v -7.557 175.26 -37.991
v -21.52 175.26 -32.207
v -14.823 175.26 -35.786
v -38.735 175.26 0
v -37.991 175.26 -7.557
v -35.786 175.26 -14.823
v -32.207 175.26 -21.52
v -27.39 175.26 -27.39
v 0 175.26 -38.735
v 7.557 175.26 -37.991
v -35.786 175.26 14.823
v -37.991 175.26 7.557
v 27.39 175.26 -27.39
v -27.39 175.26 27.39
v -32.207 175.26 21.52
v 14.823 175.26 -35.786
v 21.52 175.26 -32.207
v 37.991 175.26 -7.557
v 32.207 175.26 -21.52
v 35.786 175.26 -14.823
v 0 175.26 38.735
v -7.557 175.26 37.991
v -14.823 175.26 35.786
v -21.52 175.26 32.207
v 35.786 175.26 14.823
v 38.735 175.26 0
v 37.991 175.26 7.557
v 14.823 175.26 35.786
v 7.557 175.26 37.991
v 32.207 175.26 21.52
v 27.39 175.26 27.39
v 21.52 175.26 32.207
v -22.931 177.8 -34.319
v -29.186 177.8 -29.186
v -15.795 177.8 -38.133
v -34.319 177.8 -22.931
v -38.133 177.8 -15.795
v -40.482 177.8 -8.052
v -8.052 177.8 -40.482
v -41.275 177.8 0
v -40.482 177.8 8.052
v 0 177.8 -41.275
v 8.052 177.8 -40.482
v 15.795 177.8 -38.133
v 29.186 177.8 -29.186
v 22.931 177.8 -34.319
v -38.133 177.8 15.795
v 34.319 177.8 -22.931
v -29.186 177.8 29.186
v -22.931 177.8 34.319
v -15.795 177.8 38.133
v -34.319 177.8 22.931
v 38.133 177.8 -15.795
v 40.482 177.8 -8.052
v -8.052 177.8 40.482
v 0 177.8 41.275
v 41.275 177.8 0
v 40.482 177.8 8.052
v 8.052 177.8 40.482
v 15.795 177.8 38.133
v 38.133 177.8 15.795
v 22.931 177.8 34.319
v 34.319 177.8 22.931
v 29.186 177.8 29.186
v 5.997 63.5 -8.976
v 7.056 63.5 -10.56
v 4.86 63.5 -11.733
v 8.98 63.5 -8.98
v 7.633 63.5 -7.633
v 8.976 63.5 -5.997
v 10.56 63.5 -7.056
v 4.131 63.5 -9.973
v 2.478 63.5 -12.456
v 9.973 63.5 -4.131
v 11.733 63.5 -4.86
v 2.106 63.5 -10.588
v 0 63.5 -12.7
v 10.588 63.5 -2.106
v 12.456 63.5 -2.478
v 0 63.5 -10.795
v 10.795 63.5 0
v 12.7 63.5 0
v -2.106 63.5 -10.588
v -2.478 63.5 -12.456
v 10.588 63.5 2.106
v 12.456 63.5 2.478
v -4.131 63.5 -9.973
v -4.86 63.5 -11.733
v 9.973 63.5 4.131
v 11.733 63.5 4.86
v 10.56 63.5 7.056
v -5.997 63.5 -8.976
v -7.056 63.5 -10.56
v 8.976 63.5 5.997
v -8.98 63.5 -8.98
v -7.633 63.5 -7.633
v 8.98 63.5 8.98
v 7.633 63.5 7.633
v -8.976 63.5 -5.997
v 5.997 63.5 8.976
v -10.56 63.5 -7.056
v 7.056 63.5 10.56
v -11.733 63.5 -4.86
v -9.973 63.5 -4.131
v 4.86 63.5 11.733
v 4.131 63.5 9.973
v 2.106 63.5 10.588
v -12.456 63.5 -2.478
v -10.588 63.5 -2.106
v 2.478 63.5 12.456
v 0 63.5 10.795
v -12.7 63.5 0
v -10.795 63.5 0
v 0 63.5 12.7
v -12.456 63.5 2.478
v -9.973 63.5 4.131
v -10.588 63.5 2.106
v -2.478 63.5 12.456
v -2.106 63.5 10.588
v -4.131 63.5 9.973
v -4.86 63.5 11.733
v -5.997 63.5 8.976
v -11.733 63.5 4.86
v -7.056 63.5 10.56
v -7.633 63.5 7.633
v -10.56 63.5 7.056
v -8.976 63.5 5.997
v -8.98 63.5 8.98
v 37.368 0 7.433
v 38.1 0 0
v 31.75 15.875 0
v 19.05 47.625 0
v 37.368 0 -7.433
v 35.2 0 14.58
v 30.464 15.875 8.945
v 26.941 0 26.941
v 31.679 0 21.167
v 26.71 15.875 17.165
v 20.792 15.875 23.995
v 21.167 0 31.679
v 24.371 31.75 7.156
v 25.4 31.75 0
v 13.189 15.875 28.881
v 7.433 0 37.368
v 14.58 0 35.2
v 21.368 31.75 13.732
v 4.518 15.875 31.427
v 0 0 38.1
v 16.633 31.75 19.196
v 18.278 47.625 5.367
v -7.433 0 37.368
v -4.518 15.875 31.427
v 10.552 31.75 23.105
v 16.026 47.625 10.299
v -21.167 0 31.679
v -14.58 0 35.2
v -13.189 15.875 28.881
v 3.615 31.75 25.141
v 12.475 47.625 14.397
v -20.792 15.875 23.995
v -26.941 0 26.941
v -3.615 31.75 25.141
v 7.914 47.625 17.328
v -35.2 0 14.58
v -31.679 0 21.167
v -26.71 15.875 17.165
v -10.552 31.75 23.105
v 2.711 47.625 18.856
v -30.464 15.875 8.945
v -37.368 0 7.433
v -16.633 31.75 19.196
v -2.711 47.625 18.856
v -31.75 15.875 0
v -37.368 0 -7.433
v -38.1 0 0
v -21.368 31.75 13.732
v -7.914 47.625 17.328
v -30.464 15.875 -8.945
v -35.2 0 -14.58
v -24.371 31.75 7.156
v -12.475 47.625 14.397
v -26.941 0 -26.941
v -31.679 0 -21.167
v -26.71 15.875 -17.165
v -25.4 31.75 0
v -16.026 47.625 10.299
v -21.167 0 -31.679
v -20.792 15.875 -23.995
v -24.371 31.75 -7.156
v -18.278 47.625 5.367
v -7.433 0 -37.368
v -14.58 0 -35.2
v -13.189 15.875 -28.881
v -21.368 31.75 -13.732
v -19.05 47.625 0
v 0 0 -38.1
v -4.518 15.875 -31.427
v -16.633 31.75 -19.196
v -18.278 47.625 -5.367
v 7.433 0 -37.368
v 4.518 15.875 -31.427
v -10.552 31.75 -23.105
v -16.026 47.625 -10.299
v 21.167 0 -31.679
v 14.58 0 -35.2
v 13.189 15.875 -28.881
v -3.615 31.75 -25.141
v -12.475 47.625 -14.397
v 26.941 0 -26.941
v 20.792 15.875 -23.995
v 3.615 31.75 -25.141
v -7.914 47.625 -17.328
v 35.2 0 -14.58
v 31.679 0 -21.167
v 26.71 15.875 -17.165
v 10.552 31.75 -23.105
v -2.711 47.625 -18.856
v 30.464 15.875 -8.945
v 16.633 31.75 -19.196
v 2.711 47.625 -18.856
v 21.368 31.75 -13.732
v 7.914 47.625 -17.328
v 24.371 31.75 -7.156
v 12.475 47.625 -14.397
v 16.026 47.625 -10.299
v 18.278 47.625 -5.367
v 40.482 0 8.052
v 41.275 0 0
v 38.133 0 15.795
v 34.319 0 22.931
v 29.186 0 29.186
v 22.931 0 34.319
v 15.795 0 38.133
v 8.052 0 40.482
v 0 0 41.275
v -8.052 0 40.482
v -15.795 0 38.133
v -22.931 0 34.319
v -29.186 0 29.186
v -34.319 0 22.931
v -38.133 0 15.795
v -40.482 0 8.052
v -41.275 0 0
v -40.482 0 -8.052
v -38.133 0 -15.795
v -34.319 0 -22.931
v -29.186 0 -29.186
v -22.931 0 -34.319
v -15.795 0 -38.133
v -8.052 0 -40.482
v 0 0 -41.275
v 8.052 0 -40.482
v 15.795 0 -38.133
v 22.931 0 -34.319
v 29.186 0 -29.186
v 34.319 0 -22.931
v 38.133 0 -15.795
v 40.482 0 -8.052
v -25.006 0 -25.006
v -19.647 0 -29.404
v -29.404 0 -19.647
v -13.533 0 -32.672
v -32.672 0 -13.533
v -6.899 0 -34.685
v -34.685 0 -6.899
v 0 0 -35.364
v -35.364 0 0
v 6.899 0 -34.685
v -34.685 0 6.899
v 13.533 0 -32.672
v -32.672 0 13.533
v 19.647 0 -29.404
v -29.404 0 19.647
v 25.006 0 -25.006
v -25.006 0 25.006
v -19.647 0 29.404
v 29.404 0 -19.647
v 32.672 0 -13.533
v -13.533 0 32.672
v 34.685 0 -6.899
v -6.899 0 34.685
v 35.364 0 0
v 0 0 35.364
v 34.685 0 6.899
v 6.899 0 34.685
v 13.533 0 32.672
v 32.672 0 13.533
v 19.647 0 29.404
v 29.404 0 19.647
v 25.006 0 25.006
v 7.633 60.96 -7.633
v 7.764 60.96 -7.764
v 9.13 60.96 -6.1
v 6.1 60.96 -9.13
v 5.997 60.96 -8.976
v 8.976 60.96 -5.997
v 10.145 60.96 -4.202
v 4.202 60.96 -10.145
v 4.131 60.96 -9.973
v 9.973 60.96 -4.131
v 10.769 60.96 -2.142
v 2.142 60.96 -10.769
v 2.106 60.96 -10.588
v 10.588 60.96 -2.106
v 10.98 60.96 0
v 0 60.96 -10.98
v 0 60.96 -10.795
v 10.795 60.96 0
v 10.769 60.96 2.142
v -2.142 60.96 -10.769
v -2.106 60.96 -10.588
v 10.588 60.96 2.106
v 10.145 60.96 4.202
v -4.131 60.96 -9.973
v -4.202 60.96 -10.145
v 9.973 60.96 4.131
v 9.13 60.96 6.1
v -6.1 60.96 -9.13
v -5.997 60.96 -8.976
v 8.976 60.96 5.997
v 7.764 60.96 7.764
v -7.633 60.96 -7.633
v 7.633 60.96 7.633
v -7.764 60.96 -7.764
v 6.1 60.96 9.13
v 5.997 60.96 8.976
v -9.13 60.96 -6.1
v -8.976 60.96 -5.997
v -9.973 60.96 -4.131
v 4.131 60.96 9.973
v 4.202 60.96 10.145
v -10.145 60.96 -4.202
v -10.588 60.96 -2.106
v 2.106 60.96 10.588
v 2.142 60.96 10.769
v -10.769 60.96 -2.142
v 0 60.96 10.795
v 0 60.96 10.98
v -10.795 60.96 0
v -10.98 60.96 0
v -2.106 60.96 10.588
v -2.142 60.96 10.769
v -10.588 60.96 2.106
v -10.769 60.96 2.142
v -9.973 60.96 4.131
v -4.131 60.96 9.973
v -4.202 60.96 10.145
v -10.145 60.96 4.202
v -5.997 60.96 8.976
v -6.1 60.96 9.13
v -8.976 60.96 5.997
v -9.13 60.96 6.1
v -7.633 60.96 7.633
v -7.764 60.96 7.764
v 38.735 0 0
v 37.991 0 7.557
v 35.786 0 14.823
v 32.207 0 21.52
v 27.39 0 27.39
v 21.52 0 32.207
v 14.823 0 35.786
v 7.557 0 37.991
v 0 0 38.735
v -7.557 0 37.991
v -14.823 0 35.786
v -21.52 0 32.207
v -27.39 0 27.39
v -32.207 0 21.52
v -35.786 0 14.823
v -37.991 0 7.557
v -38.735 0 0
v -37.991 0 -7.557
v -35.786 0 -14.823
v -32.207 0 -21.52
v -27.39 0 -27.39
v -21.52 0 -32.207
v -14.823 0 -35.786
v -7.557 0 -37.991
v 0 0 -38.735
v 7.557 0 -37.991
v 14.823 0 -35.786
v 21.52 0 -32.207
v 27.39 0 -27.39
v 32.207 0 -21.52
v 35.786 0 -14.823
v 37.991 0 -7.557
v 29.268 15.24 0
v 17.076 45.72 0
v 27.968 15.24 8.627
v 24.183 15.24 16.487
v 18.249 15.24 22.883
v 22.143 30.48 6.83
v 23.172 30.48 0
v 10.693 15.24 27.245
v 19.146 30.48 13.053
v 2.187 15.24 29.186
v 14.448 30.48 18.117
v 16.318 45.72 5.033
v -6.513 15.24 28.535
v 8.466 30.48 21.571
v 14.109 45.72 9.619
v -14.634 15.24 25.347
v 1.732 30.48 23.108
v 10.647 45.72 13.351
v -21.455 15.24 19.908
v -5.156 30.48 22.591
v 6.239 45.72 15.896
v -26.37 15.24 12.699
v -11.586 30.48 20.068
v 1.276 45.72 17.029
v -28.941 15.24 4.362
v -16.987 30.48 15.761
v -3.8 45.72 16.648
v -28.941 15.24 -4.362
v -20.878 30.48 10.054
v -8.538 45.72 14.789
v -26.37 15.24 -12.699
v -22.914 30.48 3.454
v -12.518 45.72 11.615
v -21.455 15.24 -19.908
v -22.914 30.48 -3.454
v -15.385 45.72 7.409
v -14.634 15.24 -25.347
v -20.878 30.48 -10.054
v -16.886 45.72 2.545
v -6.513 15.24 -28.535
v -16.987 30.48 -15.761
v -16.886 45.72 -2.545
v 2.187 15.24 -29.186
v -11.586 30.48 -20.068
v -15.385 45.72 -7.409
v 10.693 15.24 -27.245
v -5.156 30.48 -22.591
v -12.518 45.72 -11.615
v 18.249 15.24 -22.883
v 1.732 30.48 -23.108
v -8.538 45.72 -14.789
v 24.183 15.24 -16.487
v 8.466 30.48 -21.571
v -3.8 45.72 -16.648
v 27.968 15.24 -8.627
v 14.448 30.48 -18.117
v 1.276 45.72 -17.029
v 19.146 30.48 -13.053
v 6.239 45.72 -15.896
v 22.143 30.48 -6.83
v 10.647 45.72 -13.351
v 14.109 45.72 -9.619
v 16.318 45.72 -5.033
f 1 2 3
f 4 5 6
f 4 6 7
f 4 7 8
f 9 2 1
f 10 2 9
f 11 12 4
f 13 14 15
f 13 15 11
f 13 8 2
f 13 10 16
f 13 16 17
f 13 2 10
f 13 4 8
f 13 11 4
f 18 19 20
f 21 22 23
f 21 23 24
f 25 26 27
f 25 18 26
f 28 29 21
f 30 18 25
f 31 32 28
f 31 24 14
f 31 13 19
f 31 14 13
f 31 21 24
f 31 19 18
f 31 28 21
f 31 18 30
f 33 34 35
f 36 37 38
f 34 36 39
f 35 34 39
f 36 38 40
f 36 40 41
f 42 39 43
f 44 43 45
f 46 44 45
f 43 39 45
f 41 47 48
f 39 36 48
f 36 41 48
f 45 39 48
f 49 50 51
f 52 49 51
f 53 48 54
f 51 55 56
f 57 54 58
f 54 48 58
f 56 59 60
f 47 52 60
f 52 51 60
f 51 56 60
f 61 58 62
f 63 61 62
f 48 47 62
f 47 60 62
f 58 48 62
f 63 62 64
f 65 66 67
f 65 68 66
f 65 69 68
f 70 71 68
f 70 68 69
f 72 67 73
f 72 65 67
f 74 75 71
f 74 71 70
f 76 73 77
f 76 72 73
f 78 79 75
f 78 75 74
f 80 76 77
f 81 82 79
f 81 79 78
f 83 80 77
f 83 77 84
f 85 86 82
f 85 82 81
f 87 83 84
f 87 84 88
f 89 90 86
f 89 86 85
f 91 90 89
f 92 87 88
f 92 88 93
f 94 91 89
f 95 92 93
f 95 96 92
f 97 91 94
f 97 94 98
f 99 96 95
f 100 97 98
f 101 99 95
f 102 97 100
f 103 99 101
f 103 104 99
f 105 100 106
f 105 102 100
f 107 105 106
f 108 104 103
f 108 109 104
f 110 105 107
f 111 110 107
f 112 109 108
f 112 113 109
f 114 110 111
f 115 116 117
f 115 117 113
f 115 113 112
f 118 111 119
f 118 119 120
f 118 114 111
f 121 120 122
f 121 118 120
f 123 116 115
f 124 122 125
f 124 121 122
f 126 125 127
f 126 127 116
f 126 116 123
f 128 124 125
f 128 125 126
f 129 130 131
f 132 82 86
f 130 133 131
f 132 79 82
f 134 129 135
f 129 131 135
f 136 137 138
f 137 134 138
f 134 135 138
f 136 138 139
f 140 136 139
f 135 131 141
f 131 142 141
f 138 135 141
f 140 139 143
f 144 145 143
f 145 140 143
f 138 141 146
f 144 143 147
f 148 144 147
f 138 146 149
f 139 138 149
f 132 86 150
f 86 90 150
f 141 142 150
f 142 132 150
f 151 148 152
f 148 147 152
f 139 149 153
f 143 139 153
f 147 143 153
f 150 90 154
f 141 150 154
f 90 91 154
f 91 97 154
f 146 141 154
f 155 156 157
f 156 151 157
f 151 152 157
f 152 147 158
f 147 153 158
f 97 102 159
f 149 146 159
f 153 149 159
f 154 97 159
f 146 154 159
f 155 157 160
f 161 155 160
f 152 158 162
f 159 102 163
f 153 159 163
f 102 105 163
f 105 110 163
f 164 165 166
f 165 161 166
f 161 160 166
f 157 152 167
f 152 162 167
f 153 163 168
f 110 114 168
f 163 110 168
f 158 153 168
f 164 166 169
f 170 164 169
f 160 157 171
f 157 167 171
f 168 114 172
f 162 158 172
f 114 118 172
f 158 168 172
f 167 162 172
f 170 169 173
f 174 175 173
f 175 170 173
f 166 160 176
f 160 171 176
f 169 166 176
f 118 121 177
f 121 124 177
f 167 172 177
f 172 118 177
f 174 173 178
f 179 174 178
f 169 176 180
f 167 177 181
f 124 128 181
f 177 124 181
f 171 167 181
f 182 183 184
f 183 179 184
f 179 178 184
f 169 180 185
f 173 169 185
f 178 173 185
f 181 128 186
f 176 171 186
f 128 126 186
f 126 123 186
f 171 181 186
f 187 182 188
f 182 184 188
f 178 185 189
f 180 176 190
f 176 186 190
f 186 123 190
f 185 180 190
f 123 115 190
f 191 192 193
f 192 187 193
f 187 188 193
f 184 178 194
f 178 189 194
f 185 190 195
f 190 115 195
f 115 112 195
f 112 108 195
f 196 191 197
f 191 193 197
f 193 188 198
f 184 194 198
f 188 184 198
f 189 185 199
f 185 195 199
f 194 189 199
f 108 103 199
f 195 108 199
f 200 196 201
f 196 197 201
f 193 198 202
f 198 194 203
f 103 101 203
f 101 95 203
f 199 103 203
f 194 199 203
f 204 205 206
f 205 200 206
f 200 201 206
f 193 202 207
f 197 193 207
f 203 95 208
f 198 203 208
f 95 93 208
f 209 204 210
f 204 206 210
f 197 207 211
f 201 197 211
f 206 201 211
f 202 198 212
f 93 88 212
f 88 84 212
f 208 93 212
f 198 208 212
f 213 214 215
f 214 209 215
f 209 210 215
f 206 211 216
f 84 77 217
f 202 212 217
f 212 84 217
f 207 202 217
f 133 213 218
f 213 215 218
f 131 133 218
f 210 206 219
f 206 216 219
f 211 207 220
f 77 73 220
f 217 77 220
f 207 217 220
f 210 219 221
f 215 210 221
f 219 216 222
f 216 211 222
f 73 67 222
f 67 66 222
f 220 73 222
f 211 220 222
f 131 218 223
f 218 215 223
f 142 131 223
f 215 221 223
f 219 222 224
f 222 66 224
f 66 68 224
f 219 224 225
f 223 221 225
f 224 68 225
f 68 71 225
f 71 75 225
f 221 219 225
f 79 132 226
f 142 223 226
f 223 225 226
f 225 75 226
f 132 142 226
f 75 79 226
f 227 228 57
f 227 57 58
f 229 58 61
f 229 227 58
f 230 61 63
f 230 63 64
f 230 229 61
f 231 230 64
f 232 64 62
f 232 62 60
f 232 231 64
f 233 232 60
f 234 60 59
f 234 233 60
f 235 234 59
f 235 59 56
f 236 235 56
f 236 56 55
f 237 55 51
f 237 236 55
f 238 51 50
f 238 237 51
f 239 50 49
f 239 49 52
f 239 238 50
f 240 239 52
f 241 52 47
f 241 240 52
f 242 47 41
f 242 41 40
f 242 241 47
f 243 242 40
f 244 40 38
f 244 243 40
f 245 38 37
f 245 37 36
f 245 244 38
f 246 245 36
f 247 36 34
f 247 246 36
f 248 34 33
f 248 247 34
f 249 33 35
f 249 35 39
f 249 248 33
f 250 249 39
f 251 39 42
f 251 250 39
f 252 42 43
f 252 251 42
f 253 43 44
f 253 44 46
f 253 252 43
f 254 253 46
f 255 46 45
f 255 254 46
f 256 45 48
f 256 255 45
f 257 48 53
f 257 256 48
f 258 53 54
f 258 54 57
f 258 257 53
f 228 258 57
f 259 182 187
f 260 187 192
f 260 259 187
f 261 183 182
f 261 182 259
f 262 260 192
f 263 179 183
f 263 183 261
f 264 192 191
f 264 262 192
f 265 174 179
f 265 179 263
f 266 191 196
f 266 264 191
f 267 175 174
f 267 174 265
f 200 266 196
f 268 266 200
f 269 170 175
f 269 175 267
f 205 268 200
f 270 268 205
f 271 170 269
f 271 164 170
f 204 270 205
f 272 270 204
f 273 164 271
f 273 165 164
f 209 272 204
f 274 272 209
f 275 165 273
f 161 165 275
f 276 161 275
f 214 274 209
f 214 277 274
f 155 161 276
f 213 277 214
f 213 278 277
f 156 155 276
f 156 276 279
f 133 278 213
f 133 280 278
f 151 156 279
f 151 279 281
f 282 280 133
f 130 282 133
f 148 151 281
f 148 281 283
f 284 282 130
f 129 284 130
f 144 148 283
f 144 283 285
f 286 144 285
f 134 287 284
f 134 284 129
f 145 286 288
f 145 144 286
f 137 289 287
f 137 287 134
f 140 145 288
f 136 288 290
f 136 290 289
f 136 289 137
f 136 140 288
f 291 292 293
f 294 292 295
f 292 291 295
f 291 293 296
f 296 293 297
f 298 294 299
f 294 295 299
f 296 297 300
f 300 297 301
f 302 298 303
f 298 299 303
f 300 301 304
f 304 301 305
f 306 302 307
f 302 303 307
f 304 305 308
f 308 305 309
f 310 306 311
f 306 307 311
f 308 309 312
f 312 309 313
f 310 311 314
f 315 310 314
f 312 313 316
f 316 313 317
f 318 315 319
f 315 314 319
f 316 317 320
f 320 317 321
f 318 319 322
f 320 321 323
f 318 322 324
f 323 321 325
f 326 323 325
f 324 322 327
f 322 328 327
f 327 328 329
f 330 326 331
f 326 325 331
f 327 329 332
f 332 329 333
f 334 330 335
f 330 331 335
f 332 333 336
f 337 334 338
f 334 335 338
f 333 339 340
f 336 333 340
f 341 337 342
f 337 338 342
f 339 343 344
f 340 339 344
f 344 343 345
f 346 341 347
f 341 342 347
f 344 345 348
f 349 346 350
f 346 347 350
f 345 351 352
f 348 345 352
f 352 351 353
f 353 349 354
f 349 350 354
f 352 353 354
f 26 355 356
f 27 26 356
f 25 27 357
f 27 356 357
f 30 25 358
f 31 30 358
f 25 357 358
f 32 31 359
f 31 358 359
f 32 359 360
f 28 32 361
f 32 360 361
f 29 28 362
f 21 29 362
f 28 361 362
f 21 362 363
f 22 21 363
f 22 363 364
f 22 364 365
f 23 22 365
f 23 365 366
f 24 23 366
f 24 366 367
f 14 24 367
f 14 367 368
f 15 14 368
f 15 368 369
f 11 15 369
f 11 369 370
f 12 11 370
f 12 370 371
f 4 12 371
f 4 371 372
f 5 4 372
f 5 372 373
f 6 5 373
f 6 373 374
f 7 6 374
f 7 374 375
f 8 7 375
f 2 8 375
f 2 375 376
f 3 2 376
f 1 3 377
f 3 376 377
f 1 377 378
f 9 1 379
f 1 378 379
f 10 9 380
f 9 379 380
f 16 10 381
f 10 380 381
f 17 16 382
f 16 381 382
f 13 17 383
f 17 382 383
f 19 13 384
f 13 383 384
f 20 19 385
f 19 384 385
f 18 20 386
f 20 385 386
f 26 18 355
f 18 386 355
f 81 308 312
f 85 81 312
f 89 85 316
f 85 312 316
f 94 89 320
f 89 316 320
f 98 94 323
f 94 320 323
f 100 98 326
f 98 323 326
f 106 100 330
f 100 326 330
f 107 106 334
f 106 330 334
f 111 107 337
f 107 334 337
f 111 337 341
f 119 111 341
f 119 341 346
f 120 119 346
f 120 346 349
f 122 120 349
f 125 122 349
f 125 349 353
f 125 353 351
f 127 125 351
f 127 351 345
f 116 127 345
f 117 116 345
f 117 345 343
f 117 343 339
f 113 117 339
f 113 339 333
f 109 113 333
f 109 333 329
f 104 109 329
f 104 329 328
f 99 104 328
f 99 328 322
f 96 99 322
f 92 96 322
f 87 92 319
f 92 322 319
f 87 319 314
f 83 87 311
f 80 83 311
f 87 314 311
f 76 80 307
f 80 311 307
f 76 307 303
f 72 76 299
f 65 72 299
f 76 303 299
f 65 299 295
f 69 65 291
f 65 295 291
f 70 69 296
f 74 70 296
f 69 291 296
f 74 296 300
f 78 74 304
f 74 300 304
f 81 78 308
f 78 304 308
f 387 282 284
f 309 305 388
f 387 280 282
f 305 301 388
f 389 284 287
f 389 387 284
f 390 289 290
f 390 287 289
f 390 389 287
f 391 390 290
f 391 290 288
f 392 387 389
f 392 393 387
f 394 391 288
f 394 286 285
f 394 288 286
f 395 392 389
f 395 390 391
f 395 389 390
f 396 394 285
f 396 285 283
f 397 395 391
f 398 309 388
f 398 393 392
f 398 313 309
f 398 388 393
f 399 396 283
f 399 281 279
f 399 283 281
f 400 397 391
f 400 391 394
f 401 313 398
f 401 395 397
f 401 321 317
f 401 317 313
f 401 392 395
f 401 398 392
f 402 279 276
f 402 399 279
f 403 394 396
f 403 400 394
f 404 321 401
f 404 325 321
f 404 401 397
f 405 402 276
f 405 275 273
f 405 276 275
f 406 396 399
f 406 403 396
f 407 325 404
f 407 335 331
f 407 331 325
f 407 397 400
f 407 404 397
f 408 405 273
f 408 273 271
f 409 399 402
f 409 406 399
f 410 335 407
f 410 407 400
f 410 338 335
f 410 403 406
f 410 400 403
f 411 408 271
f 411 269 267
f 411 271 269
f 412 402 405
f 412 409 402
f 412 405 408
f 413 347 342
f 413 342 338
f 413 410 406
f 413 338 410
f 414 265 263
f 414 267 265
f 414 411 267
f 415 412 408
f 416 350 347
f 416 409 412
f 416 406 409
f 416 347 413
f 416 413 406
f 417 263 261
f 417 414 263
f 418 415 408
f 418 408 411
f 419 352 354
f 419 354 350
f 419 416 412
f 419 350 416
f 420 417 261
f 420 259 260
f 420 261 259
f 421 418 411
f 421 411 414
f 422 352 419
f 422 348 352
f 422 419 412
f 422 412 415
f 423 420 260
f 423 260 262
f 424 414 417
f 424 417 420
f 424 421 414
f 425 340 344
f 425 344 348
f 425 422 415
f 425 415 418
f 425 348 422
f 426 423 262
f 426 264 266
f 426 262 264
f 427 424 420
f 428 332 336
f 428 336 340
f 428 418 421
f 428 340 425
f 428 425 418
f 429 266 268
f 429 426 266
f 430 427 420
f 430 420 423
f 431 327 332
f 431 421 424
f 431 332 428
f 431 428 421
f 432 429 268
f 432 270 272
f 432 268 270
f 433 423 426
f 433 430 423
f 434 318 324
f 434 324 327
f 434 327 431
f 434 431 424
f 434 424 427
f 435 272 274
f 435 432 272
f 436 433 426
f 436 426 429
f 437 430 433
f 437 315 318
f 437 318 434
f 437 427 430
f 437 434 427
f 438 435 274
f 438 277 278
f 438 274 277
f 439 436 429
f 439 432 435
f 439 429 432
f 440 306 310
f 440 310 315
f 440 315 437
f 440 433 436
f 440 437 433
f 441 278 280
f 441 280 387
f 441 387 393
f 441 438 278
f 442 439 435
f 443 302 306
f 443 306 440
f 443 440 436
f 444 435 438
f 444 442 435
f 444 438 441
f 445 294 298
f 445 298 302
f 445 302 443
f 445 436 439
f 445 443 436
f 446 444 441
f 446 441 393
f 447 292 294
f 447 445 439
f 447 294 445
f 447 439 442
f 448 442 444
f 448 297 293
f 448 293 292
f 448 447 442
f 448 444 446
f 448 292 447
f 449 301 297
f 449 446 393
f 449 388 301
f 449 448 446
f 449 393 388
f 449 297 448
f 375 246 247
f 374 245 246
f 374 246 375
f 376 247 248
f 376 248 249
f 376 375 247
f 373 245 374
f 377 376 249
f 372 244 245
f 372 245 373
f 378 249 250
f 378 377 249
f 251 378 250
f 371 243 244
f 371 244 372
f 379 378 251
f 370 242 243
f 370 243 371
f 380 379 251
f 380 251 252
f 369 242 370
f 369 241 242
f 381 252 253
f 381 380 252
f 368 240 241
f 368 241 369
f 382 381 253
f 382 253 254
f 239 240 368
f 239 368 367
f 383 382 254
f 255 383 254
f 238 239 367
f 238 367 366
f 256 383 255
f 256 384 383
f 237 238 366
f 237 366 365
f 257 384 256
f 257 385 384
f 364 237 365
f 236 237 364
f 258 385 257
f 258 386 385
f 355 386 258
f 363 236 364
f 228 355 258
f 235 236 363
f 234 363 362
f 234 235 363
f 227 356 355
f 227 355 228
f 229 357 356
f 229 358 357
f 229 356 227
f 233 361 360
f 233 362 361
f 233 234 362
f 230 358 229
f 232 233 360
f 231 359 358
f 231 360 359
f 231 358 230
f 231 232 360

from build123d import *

# Parameters (mm, degrees)
F1_R      = 3.175
F2_DEPTH  = 63.5
F0_R      = 38.1
F3_R      = 12.7
F5_T      = -2.54
F6_R      = 10.795
F7_DEPTH  = 136.398
F9_R      = 41.275
F10_DEPTH = 177.8
F11_T     = -2.54


with BuildPart() as f2:
    # F1 (on Front) → F2 (new body)
    with BuildSketch(Plane.XZ):
        with Locations((58.286074549, 57.9951293766)):
            Circle(F1_R)
    extrude(amount=-F2_DEPTH)


with BuildPart() as f4:
    # F0 (on Front) → F4 section 0
    with BuildSketch(Plane.XZ):
        Circle(F0_R)
    # F3 (on face) → F4 section 1
    with BuildSketch(Plane(origin=(0, 63.5, 0), x_dir=(-1, 0, 0), z_dir=(0, 1, 0))):
        Circle(F3_R)
    loft()

    # F5
    f5_openings = [f4.faces().sort_by_distance(p)[0] for p in [
        (0, 0, 0),
    ]]
    offset(amount=F5_T, openings=f5_openings, kind=Kind.INTERSECTION)

    # F6 (on Front) → F7 (cut)
    with BuildSketch(Plane.XZ):
        Circle(F6_R)
    extrude(amount=-F7_DEPTH, mode=Mode.SUBTRACT)


with BuildPart() as f10:
    # F9 (on Front) → F10 (new body)
    with BuildSketch(Plane.XZ):
        Circle(F9_R)
    extrude(amount=-F10_DEPTH)

    # F11
    f11_openings = [f10.faces().sort_by_distance(p)[0] for p in [
        (0, 0, 0),
    ]]
    offset(amount=F11_T, openings=f11_openings)


solid = Compound([f4.part, f10.part])
